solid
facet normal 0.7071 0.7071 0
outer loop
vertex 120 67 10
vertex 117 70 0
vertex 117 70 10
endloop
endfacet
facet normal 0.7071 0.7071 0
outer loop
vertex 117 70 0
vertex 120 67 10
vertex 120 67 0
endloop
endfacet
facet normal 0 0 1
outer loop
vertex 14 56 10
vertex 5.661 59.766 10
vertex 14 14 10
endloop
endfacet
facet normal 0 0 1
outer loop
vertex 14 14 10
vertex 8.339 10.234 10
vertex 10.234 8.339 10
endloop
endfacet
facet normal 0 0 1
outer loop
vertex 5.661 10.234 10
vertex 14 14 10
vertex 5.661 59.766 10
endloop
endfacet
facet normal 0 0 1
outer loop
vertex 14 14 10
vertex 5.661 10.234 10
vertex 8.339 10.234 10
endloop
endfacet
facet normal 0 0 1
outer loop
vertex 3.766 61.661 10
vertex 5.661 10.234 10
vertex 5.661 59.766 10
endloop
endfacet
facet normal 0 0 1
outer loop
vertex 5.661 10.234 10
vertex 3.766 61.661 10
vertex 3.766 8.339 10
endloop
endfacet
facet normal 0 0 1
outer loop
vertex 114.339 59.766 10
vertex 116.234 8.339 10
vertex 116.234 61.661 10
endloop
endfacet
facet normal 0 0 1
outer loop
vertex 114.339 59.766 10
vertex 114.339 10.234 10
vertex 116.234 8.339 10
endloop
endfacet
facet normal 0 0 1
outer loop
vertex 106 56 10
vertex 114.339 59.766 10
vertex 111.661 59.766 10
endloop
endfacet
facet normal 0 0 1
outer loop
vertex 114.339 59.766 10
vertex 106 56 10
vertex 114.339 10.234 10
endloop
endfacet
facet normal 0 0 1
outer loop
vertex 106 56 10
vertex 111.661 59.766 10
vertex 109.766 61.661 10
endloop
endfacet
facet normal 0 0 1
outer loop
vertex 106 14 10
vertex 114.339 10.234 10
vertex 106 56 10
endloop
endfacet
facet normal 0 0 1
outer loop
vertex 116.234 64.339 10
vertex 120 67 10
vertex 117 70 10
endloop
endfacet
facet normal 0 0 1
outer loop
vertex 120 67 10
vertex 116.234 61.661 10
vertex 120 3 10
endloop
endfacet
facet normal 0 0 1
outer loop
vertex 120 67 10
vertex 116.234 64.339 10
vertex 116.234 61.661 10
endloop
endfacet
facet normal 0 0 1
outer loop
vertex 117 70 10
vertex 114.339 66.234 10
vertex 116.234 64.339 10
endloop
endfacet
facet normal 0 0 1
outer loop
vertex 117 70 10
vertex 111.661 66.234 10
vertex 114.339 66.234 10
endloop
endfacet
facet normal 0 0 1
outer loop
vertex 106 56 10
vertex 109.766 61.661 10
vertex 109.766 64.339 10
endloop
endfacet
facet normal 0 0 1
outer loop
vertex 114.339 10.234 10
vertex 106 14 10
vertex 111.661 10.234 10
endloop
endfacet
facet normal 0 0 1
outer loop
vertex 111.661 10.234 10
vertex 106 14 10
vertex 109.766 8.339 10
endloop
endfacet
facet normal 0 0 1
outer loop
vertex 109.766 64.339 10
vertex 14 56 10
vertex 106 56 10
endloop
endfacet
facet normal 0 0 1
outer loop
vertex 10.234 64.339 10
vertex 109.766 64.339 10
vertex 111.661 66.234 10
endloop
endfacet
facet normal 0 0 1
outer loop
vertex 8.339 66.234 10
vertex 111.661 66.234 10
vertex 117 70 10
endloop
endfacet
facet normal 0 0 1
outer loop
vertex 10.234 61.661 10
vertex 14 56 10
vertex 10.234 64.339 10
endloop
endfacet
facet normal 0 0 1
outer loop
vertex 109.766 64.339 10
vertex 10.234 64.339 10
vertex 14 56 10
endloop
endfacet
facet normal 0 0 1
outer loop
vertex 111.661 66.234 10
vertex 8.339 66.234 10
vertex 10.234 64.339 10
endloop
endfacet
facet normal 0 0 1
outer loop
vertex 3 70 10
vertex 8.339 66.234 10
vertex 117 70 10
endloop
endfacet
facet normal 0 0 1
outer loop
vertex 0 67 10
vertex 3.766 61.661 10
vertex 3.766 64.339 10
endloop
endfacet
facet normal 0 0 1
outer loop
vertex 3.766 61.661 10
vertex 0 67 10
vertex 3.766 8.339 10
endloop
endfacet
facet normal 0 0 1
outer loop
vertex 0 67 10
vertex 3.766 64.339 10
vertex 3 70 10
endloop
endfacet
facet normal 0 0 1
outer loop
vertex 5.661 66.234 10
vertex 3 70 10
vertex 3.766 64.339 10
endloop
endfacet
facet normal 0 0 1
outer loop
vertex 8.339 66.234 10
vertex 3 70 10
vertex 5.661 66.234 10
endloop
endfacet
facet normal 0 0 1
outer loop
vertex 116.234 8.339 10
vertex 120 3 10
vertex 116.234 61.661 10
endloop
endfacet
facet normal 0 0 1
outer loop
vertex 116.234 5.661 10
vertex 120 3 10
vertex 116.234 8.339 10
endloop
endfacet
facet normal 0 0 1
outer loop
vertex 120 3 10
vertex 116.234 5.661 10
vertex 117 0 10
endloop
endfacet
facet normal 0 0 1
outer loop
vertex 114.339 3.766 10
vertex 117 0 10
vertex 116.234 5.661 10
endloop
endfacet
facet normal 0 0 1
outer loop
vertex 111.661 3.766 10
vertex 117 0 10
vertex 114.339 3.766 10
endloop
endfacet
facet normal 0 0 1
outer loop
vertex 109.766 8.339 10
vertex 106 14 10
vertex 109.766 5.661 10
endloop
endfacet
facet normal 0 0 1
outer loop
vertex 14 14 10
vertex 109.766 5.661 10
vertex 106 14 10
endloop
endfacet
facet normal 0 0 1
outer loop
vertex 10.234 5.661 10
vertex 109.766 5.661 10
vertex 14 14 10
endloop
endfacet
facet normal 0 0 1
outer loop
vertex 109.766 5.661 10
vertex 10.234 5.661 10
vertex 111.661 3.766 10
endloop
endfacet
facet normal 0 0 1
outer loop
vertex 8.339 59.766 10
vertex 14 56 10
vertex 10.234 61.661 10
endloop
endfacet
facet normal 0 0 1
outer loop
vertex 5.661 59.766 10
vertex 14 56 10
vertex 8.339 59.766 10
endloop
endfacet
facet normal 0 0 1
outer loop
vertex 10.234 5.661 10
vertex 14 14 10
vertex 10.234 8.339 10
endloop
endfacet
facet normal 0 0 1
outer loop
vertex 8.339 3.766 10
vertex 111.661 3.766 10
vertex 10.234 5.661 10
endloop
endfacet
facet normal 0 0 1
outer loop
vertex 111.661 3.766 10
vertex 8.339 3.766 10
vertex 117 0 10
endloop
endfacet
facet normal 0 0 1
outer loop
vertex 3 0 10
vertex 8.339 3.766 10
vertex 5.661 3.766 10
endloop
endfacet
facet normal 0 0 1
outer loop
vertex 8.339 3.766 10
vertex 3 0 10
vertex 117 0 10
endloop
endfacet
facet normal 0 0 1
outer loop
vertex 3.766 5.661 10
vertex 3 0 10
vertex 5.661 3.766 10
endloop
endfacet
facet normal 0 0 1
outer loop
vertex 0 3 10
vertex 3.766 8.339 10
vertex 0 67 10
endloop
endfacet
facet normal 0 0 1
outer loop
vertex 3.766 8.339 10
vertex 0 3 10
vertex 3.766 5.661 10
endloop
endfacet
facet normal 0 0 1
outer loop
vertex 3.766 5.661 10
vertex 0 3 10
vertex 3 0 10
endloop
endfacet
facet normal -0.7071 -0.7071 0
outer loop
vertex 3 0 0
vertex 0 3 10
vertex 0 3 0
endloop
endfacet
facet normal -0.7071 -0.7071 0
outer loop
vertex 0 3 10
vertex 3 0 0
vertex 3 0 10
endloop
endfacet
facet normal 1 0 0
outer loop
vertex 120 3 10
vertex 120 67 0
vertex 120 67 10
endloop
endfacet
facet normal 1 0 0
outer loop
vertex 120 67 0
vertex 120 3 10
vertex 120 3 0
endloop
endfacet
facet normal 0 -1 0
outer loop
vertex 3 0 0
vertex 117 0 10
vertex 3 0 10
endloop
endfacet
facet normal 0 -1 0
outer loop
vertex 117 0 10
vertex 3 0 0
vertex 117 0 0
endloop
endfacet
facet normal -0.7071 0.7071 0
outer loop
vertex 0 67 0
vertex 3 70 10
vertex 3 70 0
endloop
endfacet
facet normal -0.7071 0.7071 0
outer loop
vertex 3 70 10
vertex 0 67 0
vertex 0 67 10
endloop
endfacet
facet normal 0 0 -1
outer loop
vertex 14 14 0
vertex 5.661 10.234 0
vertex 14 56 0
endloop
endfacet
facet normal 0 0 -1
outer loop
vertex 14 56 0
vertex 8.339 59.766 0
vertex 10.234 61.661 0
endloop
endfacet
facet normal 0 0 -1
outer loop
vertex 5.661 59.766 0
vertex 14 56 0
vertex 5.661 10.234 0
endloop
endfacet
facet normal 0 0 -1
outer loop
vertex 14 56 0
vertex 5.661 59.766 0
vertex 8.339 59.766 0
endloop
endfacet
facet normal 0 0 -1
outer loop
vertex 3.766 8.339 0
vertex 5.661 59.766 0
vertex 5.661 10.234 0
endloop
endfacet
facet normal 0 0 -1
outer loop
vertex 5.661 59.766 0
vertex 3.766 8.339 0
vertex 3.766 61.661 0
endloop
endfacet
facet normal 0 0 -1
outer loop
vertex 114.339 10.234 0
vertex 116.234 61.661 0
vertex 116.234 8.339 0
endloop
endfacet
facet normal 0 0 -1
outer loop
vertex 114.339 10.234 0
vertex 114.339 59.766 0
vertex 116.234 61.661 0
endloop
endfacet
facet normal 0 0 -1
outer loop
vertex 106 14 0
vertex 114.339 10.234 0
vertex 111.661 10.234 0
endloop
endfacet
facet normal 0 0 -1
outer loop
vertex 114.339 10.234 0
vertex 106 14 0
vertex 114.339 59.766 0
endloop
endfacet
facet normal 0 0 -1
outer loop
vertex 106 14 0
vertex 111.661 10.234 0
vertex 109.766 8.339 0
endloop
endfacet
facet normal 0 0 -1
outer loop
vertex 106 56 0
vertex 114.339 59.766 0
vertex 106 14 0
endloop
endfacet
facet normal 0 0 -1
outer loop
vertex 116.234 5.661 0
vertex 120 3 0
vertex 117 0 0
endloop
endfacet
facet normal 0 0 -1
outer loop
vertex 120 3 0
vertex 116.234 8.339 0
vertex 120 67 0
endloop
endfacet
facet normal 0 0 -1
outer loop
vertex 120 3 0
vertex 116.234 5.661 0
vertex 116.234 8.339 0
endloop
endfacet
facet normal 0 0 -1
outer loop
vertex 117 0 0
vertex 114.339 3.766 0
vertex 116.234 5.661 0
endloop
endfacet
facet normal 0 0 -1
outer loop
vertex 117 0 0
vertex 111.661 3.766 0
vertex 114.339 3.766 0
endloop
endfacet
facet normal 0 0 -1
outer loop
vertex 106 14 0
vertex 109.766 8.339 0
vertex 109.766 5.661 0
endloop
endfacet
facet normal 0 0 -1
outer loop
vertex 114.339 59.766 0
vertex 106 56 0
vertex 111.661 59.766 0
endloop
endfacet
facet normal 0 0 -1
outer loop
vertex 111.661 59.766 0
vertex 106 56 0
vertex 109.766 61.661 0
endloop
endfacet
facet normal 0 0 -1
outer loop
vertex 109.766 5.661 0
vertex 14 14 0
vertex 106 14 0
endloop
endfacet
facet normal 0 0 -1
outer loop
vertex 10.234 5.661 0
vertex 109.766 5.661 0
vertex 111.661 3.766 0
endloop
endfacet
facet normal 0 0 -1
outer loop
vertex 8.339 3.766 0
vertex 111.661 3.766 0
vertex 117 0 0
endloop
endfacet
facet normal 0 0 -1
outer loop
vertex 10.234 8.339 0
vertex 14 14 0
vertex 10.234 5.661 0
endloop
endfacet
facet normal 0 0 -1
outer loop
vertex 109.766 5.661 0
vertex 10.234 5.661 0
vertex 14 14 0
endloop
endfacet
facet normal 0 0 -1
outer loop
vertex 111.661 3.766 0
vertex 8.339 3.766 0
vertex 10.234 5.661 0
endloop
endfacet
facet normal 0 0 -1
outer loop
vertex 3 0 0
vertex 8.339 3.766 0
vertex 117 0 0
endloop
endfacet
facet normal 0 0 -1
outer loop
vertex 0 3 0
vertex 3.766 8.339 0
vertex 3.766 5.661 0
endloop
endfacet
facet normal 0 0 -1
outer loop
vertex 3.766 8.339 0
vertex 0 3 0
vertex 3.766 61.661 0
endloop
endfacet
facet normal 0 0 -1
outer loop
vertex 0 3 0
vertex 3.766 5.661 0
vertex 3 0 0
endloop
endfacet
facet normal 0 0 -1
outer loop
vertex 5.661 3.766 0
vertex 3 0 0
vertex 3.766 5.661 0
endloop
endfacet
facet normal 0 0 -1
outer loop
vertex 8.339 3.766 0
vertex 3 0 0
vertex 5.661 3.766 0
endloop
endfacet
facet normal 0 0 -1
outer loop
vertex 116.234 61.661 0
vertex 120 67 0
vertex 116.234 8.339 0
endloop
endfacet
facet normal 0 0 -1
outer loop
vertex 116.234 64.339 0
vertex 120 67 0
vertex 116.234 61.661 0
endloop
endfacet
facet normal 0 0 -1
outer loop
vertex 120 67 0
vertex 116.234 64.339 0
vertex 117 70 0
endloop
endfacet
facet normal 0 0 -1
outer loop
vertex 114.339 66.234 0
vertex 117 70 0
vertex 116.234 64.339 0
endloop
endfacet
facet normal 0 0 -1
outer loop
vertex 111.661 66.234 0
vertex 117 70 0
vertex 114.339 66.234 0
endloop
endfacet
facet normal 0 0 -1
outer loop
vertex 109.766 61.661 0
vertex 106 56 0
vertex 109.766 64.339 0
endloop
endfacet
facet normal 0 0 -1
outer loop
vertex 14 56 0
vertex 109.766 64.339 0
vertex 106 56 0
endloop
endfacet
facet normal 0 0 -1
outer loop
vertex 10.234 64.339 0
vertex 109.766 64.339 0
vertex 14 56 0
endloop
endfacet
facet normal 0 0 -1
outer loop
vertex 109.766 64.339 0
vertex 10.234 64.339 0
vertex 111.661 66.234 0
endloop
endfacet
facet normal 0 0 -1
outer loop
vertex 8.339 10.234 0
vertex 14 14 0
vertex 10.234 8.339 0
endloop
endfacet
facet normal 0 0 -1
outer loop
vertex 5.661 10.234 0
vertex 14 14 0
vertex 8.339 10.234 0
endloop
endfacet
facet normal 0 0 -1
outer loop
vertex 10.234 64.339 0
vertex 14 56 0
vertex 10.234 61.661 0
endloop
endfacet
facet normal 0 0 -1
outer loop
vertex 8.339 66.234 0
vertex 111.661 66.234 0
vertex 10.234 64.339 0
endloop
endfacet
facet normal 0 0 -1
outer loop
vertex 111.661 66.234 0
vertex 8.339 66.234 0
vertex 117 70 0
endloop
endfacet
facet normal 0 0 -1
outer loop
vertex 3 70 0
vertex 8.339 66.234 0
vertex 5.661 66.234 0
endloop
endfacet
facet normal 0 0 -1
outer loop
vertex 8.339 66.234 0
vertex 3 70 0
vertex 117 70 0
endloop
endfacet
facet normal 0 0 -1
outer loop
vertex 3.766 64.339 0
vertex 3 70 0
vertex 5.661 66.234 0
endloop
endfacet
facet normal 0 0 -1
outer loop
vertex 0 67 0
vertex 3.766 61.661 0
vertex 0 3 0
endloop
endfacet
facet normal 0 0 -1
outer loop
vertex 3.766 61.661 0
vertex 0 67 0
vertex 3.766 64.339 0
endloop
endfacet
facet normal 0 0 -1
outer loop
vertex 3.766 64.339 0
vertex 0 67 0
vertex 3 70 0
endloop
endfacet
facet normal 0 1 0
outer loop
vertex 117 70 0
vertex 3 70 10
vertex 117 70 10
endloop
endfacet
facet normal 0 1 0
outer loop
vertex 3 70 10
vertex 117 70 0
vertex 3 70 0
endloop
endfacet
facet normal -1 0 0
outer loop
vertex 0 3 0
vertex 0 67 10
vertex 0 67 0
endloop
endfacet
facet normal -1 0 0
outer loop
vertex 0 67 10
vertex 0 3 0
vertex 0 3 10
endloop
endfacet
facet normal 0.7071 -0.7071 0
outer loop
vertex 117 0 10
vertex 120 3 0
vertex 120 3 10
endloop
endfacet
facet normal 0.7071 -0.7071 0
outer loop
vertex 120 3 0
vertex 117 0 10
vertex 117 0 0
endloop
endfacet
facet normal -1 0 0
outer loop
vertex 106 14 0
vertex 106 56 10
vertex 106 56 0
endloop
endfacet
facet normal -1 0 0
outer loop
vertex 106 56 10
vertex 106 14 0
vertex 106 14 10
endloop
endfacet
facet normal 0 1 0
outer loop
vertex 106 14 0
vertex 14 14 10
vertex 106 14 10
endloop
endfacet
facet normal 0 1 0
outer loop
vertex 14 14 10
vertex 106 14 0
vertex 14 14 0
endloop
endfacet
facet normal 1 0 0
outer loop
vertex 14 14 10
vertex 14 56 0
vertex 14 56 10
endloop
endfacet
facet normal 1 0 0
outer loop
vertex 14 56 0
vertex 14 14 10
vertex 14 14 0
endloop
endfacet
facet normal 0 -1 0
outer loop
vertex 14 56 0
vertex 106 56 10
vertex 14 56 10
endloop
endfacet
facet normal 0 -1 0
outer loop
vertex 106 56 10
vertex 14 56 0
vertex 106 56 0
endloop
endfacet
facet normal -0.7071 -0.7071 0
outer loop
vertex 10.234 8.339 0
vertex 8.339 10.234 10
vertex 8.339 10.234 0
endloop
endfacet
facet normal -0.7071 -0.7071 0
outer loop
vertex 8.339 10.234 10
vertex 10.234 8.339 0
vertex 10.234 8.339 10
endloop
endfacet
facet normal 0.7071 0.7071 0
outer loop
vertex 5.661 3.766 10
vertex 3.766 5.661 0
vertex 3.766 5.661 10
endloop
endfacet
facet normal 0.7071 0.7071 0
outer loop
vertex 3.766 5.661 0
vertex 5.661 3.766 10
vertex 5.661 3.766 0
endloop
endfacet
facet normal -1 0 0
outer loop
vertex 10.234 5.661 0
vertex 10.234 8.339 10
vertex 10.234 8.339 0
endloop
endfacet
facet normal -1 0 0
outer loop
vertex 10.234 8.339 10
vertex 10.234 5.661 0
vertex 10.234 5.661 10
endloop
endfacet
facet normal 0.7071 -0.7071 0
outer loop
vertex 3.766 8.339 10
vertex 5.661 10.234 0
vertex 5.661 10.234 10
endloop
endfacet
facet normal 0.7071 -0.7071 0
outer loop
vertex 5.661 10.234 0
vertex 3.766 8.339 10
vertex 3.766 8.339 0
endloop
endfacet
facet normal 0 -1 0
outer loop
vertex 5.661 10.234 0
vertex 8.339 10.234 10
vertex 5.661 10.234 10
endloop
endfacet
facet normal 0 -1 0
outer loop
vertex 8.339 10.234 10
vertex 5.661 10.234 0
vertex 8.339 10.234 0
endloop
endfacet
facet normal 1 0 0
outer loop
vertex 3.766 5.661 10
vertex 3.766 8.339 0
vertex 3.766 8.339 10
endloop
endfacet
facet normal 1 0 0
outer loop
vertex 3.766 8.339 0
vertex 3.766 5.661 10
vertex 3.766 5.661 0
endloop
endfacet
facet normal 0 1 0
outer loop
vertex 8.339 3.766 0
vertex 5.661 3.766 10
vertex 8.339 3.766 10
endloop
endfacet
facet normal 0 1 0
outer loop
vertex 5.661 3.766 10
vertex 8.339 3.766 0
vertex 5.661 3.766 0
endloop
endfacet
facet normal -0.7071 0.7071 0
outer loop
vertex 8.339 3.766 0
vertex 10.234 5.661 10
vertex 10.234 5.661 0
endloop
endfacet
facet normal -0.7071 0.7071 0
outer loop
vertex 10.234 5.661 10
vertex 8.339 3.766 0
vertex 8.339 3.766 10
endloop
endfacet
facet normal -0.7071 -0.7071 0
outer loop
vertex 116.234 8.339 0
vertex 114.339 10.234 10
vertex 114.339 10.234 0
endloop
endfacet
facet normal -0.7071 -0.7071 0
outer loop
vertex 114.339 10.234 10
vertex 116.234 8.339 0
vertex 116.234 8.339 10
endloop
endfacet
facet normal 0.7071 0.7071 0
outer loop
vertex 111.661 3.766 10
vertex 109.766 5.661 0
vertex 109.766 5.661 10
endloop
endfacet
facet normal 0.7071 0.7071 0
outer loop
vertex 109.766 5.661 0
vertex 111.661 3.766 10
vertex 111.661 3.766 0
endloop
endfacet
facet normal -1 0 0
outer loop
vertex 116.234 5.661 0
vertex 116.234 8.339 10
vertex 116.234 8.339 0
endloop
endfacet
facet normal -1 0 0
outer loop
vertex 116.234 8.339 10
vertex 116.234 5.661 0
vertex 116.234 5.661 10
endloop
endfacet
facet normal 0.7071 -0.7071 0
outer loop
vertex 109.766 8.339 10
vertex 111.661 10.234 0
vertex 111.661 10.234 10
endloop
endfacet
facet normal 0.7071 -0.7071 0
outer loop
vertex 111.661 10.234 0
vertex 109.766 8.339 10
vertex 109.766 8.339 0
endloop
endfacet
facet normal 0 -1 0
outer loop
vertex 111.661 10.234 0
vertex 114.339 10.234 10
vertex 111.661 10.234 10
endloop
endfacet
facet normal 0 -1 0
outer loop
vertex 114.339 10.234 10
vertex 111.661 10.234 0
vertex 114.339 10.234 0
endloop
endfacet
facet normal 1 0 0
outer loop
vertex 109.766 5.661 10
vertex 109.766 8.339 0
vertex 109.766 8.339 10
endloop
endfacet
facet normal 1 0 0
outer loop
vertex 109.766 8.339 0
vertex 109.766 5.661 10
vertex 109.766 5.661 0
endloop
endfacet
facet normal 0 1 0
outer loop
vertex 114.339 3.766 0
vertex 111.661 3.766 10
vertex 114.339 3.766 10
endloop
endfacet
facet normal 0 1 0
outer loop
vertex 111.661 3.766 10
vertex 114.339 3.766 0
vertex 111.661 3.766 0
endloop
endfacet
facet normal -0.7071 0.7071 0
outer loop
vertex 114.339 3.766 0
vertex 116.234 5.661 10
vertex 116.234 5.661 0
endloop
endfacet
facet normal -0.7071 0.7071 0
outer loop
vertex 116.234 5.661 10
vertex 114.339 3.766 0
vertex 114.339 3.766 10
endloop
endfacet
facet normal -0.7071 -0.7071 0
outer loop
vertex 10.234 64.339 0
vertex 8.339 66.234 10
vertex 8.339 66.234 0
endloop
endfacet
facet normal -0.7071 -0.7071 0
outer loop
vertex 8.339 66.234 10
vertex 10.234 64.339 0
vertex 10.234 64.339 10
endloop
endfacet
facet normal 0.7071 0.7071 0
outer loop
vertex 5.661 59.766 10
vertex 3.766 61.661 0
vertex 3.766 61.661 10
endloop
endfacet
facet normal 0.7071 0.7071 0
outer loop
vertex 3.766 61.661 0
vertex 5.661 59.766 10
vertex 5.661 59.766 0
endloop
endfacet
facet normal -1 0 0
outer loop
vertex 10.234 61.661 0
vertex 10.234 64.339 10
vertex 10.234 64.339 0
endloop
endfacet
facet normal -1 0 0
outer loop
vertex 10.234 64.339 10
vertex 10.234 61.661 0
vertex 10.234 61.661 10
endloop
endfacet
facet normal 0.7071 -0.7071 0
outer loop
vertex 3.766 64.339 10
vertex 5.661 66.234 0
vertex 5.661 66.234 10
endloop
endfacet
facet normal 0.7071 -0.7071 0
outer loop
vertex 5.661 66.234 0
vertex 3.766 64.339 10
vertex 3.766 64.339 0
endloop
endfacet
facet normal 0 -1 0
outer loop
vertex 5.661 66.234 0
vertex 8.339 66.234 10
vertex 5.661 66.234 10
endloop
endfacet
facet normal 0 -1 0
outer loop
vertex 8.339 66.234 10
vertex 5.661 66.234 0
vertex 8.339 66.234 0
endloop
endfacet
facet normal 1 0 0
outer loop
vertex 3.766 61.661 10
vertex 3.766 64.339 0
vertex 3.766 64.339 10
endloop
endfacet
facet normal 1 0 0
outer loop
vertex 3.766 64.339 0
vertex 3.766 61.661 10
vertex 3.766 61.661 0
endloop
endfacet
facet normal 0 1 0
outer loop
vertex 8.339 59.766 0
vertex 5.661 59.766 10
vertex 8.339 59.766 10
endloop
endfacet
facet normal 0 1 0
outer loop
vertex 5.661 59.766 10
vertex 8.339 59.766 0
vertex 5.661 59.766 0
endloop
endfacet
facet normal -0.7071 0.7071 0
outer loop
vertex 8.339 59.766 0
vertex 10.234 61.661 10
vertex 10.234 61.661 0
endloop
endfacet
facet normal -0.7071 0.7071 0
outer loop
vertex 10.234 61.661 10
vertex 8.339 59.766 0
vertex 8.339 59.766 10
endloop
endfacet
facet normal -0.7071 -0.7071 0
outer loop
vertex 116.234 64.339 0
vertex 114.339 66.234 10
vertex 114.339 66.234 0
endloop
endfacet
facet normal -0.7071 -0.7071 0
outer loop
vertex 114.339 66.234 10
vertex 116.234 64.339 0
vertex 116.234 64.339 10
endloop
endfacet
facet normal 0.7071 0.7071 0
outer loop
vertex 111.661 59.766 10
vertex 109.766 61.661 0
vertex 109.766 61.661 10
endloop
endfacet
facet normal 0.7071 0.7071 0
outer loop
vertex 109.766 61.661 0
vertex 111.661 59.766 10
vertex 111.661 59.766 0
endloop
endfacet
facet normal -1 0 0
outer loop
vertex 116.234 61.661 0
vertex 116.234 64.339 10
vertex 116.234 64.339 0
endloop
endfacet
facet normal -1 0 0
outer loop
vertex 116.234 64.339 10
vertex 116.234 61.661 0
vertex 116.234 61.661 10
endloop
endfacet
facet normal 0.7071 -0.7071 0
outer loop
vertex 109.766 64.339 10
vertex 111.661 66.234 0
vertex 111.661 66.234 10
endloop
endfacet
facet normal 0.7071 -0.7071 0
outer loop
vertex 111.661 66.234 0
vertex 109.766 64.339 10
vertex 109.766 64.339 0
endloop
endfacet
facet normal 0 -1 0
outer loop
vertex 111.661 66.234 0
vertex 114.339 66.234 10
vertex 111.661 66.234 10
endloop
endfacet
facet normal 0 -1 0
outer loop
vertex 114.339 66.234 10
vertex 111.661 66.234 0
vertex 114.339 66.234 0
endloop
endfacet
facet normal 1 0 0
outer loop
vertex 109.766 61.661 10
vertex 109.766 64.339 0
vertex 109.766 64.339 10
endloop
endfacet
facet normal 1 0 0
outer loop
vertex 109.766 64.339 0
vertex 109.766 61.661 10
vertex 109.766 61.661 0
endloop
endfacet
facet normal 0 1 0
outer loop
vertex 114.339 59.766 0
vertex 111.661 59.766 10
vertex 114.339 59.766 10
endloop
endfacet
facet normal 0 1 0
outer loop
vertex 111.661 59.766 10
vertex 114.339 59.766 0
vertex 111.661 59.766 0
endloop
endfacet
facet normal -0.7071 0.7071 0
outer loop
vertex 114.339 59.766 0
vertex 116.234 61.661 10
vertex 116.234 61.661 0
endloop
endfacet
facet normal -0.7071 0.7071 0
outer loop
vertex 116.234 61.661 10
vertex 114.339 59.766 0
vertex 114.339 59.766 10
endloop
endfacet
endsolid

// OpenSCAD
$fn = 32;

// ----------------------------------------------------------------------
// Frame plate: 120 x 70 frame, 14 mm rails
// ----------------------------------------------------------------------

// --- parameters (mm) ---
plate_l = 120;            // plate length, X
plate_w = 70;             // plate width, Y
plate_t = 10;             // plate thickness, Z (extrusion height)
corner_c = 3;             // corner chamfer
frame_bar = 14;           // frame rail width
bolt_r = 3.5;             // corner bolt window radius
bolt_inset = 7;           // bolt centre inset from the edges

win_l = plate_l - 2 * frame_bar;  // window length
win_w = plate_w - 2 * frame_bar;  // window width
bolt_d = 2 * bolt_r;  // corner hole diameter

profile = [[3, 0], [117, 0], [120, 3], [120, 67], [117, 70], [3, 70], [0, 67], [0, 3]];  // primary outline, 8 points, counter clockwise
void_1 = [[14, 14], [106, 14], [106, 56], [14, 56]];  // the window, 4 points
void_2 = [[10.234, 8.339], [8.339, 10.234], [5.661, 10.234], [3.766, 8.339], [3.766, 5.661], [5.661, 3.766], [8.339, 3.766], [10.234, 5.661]];  // corner bolt window, 8 points
void_3 = [[116.234, 8.339], [114.339, 10.234], [111.661, 10.234], [109.766, 8.339], [109.766, 5.661], [111.661, 3.766], [114.339, 3.766], [116.234, 5.661]];  // corner bolt window, 8 points
void_4 = [[10.234, 64.339], [8.339, 66.234], [5.661, 66.234], [3.766, 64.339], [3.766, 61.661], [5.661, 59.766], [8.339, 59.766], [10.234, 61.661]];  // corner bolt window, 8 points
void_5 = [[116.234, 64.339], [114.339, 66.234], [111.661, 66.234], [109.766, 64.339], [109.766, 61.661], [111.661, 59.766], [114.339, 59.766], [116.234, 61.661]];  // corner bolt window, 8 points

// --- the one profile operation ---
difference() {
  linear_extrude(height = plate_t) polygon(points = profile);
  translate([0, 0, -1])
    linear_extrude(height = plate_t + 2) polygon(points = void_1);
  translate([0, 0, -1])
    linear_extrude(height = plate_t + 2) polygon(points = void_2);
  translate([0, 0, -1])
    linear_extrude(height = plate_t + 2) polygon(points = void_3);
  translate([0, 0, -1])
    linear_extrude(height = plate_t + 2) polygon(points = void_4);
  translate([0, 0, -1])
    linear_extrude(height = plate_t + 2) polygon(points = void_5);
}
